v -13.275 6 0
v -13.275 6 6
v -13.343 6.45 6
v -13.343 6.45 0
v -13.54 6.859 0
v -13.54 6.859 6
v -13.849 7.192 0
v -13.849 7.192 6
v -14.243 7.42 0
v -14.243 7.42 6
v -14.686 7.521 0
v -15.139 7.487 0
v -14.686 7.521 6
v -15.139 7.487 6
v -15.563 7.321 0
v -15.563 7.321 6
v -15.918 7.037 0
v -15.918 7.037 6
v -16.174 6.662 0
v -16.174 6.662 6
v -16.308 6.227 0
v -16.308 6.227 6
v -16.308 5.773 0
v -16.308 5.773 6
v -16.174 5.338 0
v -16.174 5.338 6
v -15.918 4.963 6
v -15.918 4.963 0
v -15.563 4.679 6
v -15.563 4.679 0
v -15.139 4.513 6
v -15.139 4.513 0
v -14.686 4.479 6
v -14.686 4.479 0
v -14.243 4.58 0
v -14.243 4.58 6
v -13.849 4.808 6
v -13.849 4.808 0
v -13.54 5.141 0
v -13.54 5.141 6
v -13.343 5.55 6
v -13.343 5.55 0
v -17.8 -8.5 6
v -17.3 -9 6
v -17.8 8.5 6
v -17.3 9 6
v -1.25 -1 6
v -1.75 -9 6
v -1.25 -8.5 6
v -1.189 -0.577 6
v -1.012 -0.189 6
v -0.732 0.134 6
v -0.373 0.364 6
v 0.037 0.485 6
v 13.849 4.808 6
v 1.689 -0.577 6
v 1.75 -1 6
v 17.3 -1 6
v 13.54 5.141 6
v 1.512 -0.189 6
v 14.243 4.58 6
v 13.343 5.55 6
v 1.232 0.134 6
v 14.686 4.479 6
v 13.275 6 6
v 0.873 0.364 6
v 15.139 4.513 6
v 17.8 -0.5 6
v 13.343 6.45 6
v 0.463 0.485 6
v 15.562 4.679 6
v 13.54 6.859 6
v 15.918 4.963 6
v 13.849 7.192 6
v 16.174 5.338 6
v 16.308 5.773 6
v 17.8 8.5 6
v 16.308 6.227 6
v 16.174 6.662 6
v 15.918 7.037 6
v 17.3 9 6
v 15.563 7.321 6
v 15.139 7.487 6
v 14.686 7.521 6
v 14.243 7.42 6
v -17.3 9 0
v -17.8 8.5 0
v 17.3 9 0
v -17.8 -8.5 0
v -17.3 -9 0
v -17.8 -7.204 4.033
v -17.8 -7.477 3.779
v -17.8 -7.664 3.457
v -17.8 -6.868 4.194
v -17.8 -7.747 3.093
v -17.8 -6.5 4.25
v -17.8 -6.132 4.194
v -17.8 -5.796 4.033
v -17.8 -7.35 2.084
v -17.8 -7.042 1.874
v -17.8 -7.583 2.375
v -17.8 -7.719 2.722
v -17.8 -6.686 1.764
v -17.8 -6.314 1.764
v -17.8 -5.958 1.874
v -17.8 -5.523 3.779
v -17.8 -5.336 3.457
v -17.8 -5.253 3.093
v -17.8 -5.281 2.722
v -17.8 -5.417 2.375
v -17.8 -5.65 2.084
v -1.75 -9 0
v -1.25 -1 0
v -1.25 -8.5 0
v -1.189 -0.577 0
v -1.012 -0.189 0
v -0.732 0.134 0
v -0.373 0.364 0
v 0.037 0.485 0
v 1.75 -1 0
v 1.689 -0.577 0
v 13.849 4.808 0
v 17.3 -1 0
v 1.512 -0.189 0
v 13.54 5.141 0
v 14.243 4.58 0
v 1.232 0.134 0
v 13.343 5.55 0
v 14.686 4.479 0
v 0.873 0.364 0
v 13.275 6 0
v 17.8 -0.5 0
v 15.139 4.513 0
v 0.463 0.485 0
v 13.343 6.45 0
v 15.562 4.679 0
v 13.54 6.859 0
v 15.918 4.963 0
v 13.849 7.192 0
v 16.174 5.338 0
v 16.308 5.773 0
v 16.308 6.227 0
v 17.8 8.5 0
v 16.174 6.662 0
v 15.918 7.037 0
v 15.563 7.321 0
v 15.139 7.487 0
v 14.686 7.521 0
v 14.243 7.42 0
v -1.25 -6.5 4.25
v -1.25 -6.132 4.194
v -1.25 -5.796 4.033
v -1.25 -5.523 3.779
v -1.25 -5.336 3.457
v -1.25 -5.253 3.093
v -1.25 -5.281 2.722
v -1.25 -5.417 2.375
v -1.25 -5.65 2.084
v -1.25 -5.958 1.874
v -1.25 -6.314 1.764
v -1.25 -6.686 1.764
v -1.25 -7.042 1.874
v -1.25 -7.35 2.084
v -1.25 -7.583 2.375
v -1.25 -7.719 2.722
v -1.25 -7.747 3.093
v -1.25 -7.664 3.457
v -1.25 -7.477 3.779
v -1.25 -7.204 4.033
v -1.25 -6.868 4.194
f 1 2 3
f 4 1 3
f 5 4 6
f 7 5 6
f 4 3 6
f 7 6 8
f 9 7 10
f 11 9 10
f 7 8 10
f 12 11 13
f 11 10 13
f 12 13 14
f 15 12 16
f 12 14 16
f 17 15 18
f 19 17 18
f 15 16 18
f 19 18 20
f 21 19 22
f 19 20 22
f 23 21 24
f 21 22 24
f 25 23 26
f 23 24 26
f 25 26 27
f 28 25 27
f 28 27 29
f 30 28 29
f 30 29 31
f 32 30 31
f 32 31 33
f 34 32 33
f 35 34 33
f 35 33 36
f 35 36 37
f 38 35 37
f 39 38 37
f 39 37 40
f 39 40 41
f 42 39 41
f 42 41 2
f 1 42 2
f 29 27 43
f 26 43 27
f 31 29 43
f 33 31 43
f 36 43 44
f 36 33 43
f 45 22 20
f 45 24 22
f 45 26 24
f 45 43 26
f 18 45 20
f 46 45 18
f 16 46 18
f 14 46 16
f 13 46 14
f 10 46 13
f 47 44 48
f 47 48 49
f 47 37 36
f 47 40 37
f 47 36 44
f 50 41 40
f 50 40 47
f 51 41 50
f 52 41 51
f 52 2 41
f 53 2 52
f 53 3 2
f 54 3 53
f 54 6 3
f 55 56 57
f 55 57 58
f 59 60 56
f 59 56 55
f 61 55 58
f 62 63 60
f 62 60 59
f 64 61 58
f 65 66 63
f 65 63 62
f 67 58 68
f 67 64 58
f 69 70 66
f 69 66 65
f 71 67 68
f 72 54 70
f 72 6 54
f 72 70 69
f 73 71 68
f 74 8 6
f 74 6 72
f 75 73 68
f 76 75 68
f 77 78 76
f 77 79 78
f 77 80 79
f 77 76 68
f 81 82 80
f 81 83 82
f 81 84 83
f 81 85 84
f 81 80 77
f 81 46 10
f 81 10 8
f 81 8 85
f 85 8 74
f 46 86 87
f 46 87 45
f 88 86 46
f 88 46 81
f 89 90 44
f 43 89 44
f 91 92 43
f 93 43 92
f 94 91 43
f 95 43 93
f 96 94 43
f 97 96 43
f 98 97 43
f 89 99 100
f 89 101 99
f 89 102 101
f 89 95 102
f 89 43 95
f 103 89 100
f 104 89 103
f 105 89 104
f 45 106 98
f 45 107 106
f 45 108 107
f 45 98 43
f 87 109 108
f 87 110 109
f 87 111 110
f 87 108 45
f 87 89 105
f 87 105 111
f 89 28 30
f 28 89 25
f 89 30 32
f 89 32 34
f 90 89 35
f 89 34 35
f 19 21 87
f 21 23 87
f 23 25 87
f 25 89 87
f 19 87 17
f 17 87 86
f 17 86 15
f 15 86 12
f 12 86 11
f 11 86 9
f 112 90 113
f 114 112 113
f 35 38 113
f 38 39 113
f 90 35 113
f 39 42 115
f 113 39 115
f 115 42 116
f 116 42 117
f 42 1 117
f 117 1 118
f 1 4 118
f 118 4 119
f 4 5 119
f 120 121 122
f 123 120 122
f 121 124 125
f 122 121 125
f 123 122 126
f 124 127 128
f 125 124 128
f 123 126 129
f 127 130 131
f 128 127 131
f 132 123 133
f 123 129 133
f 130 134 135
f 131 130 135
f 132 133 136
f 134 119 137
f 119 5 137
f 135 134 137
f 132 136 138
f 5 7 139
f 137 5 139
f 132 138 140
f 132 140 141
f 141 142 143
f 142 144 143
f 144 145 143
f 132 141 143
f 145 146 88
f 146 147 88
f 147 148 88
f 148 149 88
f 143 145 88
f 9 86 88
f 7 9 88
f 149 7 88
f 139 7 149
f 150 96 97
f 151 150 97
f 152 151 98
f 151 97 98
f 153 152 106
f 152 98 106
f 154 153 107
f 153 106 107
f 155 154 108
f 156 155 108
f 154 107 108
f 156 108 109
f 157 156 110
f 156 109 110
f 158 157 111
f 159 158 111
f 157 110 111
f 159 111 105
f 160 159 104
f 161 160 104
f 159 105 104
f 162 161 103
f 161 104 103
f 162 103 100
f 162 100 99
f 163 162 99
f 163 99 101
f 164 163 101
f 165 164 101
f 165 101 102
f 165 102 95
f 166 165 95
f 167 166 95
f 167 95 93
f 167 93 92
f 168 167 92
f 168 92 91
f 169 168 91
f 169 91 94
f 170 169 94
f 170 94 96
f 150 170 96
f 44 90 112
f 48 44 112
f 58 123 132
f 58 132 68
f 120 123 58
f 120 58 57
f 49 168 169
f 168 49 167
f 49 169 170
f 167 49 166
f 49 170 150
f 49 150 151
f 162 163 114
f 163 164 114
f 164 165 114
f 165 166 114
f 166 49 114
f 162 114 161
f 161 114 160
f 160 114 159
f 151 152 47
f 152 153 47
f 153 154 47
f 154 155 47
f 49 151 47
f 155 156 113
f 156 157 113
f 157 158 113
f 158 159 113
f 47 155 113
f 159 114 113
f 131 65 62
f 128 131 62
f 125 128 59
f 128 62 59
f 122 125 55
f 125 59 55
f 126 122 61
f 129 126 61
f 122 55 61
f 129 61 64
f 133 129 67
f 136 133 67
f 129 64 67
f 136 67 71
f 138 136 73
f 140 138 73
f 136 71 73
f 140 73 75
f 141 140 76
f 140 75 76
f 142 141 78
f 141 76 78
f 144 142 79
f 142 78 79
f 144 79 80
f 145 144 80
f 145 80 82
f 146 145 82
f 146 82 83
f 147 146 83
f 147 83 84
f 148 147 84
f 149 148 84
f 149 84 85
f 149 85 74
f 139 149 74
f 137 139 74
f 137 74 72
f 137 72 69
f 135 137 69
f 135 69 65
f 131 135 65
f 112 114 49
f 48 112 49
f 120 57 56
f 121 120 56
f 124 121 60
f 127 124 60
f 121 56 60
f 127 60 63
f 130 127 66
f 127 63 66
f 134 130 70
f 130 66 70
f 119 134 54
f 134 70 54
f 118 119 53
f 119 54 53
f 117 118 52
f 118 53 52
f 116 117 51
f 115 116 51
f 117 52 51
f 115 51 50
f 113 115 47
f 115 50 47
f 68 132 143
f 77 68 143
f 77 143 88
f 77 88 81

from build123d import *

# Parameters (mm, degrees)
SKETCH_1_W          = 35.6
SKETCH_1_H          = 18
EXTRUDE_1_DEPTH     = 6
SKETCH_3_W          = 2.5
SKETCH_3_H          = 16
CUT_EXTRUDE_1_DEPTH = 28
SKETCH_4_W          = 16.55
SKETCH_4_H          = 8
CUT_EXTRUDE_2_DEPTH = 10
HOLE_WIZARD_M3_1_D  = 2.5
SKETCH_8_R          = 1.525
CUT_EXTRUDE_3_DEPTH = 22
CHAMFER_1_SIZE      = 0.5
SKETCH_9_R          = 1.5
CUT_EXTRUDE_4_DEPTH = 10


with BuildPart() as part:
    # 草图1 → 凸台-拉伸1 (new body)
    with BuildSketch(Plane.XY):
        Rectangle(SKETCH_1_W, SKETCH_1_H)
    extrude(amount=EXTRUDE_1_DEPTH)

    # 草图3 → 切除-拉伸1 (cut)
    with BuildSketch(Plane(origin=(0, 0, 0), x_dir=(-1, 0, 0), z_dir=(0, 0, -1))):
        with Locations((0, -9)):
            Rectangle(SKETCH_3_W, SKETCH_3_H)
    extrude(amount=-CUT_EXTRUDE_1_DEPTH, mode=Mode.SUBTRACT)

    # 草图4 → 切除-拉伸2 (cut)
    with BuildSketch(Plane(origin=(0, 0, 0), x_dir=(-1, 0, 0), z_dir=(0, 0, -1))):
        with Locations((-9.525, -5)):
            Rectangle(SKETCH_4_W, SKETCH_4_H)
    extrude(amount=-CUT_EXTRUDE_2_DEPTH, mode=Mode.SUBTRACT)

    # M3 螺纹孔1 (through all)
    with Locations(Plane(origin=(-1.25, 0, 0), x_dir=(0, 0, -1), z_dir=(1, 0, 0))):
        with Locations((-3, -6.5)):
            Hole(HOLE_WIZARD_M3_1_D / 2)

    # 草图8 → 切除-拉伸3 (cut)
    with BuildSketch(Plane.XY.offset(6)):
        with Locations((-14.8, 6)):
            Circle(SKETCH_8_R)
        with Locations(Location((14.8, 6, 0), (0, 0, 180))):
            Circle(SKETCH_8_R)
    extrude(amount=-CUT_EXTRUDE_3_DEPTH, mode=Mode.SUBTRACT)

    # 倒角1
    chamfer_1_edges = [part.edges().sort_by_distance(p)[0] for p in [
        (-1.25, -9, 3),
        (17.8, -1, 3),
        (-17.8, -9, 3),
        (-17.8, 9, 3),
        (17.8, 9, 3),
    ]]
    chamfer(chamfer_1_edges, length=CHAMFER_1_SIZE)

    # 草图9 → 切除-拉伸4 (cut)
    with BuildSketch(Plane.XY.offset(6)):
        with Locations((0.25, -1)):
            Circle(SKETCH_9_R)
    extrude(amount=-CUT_EXTRUDE_4_DEPTH, mode=Mode.SUBTRACT)


solid = part.part
